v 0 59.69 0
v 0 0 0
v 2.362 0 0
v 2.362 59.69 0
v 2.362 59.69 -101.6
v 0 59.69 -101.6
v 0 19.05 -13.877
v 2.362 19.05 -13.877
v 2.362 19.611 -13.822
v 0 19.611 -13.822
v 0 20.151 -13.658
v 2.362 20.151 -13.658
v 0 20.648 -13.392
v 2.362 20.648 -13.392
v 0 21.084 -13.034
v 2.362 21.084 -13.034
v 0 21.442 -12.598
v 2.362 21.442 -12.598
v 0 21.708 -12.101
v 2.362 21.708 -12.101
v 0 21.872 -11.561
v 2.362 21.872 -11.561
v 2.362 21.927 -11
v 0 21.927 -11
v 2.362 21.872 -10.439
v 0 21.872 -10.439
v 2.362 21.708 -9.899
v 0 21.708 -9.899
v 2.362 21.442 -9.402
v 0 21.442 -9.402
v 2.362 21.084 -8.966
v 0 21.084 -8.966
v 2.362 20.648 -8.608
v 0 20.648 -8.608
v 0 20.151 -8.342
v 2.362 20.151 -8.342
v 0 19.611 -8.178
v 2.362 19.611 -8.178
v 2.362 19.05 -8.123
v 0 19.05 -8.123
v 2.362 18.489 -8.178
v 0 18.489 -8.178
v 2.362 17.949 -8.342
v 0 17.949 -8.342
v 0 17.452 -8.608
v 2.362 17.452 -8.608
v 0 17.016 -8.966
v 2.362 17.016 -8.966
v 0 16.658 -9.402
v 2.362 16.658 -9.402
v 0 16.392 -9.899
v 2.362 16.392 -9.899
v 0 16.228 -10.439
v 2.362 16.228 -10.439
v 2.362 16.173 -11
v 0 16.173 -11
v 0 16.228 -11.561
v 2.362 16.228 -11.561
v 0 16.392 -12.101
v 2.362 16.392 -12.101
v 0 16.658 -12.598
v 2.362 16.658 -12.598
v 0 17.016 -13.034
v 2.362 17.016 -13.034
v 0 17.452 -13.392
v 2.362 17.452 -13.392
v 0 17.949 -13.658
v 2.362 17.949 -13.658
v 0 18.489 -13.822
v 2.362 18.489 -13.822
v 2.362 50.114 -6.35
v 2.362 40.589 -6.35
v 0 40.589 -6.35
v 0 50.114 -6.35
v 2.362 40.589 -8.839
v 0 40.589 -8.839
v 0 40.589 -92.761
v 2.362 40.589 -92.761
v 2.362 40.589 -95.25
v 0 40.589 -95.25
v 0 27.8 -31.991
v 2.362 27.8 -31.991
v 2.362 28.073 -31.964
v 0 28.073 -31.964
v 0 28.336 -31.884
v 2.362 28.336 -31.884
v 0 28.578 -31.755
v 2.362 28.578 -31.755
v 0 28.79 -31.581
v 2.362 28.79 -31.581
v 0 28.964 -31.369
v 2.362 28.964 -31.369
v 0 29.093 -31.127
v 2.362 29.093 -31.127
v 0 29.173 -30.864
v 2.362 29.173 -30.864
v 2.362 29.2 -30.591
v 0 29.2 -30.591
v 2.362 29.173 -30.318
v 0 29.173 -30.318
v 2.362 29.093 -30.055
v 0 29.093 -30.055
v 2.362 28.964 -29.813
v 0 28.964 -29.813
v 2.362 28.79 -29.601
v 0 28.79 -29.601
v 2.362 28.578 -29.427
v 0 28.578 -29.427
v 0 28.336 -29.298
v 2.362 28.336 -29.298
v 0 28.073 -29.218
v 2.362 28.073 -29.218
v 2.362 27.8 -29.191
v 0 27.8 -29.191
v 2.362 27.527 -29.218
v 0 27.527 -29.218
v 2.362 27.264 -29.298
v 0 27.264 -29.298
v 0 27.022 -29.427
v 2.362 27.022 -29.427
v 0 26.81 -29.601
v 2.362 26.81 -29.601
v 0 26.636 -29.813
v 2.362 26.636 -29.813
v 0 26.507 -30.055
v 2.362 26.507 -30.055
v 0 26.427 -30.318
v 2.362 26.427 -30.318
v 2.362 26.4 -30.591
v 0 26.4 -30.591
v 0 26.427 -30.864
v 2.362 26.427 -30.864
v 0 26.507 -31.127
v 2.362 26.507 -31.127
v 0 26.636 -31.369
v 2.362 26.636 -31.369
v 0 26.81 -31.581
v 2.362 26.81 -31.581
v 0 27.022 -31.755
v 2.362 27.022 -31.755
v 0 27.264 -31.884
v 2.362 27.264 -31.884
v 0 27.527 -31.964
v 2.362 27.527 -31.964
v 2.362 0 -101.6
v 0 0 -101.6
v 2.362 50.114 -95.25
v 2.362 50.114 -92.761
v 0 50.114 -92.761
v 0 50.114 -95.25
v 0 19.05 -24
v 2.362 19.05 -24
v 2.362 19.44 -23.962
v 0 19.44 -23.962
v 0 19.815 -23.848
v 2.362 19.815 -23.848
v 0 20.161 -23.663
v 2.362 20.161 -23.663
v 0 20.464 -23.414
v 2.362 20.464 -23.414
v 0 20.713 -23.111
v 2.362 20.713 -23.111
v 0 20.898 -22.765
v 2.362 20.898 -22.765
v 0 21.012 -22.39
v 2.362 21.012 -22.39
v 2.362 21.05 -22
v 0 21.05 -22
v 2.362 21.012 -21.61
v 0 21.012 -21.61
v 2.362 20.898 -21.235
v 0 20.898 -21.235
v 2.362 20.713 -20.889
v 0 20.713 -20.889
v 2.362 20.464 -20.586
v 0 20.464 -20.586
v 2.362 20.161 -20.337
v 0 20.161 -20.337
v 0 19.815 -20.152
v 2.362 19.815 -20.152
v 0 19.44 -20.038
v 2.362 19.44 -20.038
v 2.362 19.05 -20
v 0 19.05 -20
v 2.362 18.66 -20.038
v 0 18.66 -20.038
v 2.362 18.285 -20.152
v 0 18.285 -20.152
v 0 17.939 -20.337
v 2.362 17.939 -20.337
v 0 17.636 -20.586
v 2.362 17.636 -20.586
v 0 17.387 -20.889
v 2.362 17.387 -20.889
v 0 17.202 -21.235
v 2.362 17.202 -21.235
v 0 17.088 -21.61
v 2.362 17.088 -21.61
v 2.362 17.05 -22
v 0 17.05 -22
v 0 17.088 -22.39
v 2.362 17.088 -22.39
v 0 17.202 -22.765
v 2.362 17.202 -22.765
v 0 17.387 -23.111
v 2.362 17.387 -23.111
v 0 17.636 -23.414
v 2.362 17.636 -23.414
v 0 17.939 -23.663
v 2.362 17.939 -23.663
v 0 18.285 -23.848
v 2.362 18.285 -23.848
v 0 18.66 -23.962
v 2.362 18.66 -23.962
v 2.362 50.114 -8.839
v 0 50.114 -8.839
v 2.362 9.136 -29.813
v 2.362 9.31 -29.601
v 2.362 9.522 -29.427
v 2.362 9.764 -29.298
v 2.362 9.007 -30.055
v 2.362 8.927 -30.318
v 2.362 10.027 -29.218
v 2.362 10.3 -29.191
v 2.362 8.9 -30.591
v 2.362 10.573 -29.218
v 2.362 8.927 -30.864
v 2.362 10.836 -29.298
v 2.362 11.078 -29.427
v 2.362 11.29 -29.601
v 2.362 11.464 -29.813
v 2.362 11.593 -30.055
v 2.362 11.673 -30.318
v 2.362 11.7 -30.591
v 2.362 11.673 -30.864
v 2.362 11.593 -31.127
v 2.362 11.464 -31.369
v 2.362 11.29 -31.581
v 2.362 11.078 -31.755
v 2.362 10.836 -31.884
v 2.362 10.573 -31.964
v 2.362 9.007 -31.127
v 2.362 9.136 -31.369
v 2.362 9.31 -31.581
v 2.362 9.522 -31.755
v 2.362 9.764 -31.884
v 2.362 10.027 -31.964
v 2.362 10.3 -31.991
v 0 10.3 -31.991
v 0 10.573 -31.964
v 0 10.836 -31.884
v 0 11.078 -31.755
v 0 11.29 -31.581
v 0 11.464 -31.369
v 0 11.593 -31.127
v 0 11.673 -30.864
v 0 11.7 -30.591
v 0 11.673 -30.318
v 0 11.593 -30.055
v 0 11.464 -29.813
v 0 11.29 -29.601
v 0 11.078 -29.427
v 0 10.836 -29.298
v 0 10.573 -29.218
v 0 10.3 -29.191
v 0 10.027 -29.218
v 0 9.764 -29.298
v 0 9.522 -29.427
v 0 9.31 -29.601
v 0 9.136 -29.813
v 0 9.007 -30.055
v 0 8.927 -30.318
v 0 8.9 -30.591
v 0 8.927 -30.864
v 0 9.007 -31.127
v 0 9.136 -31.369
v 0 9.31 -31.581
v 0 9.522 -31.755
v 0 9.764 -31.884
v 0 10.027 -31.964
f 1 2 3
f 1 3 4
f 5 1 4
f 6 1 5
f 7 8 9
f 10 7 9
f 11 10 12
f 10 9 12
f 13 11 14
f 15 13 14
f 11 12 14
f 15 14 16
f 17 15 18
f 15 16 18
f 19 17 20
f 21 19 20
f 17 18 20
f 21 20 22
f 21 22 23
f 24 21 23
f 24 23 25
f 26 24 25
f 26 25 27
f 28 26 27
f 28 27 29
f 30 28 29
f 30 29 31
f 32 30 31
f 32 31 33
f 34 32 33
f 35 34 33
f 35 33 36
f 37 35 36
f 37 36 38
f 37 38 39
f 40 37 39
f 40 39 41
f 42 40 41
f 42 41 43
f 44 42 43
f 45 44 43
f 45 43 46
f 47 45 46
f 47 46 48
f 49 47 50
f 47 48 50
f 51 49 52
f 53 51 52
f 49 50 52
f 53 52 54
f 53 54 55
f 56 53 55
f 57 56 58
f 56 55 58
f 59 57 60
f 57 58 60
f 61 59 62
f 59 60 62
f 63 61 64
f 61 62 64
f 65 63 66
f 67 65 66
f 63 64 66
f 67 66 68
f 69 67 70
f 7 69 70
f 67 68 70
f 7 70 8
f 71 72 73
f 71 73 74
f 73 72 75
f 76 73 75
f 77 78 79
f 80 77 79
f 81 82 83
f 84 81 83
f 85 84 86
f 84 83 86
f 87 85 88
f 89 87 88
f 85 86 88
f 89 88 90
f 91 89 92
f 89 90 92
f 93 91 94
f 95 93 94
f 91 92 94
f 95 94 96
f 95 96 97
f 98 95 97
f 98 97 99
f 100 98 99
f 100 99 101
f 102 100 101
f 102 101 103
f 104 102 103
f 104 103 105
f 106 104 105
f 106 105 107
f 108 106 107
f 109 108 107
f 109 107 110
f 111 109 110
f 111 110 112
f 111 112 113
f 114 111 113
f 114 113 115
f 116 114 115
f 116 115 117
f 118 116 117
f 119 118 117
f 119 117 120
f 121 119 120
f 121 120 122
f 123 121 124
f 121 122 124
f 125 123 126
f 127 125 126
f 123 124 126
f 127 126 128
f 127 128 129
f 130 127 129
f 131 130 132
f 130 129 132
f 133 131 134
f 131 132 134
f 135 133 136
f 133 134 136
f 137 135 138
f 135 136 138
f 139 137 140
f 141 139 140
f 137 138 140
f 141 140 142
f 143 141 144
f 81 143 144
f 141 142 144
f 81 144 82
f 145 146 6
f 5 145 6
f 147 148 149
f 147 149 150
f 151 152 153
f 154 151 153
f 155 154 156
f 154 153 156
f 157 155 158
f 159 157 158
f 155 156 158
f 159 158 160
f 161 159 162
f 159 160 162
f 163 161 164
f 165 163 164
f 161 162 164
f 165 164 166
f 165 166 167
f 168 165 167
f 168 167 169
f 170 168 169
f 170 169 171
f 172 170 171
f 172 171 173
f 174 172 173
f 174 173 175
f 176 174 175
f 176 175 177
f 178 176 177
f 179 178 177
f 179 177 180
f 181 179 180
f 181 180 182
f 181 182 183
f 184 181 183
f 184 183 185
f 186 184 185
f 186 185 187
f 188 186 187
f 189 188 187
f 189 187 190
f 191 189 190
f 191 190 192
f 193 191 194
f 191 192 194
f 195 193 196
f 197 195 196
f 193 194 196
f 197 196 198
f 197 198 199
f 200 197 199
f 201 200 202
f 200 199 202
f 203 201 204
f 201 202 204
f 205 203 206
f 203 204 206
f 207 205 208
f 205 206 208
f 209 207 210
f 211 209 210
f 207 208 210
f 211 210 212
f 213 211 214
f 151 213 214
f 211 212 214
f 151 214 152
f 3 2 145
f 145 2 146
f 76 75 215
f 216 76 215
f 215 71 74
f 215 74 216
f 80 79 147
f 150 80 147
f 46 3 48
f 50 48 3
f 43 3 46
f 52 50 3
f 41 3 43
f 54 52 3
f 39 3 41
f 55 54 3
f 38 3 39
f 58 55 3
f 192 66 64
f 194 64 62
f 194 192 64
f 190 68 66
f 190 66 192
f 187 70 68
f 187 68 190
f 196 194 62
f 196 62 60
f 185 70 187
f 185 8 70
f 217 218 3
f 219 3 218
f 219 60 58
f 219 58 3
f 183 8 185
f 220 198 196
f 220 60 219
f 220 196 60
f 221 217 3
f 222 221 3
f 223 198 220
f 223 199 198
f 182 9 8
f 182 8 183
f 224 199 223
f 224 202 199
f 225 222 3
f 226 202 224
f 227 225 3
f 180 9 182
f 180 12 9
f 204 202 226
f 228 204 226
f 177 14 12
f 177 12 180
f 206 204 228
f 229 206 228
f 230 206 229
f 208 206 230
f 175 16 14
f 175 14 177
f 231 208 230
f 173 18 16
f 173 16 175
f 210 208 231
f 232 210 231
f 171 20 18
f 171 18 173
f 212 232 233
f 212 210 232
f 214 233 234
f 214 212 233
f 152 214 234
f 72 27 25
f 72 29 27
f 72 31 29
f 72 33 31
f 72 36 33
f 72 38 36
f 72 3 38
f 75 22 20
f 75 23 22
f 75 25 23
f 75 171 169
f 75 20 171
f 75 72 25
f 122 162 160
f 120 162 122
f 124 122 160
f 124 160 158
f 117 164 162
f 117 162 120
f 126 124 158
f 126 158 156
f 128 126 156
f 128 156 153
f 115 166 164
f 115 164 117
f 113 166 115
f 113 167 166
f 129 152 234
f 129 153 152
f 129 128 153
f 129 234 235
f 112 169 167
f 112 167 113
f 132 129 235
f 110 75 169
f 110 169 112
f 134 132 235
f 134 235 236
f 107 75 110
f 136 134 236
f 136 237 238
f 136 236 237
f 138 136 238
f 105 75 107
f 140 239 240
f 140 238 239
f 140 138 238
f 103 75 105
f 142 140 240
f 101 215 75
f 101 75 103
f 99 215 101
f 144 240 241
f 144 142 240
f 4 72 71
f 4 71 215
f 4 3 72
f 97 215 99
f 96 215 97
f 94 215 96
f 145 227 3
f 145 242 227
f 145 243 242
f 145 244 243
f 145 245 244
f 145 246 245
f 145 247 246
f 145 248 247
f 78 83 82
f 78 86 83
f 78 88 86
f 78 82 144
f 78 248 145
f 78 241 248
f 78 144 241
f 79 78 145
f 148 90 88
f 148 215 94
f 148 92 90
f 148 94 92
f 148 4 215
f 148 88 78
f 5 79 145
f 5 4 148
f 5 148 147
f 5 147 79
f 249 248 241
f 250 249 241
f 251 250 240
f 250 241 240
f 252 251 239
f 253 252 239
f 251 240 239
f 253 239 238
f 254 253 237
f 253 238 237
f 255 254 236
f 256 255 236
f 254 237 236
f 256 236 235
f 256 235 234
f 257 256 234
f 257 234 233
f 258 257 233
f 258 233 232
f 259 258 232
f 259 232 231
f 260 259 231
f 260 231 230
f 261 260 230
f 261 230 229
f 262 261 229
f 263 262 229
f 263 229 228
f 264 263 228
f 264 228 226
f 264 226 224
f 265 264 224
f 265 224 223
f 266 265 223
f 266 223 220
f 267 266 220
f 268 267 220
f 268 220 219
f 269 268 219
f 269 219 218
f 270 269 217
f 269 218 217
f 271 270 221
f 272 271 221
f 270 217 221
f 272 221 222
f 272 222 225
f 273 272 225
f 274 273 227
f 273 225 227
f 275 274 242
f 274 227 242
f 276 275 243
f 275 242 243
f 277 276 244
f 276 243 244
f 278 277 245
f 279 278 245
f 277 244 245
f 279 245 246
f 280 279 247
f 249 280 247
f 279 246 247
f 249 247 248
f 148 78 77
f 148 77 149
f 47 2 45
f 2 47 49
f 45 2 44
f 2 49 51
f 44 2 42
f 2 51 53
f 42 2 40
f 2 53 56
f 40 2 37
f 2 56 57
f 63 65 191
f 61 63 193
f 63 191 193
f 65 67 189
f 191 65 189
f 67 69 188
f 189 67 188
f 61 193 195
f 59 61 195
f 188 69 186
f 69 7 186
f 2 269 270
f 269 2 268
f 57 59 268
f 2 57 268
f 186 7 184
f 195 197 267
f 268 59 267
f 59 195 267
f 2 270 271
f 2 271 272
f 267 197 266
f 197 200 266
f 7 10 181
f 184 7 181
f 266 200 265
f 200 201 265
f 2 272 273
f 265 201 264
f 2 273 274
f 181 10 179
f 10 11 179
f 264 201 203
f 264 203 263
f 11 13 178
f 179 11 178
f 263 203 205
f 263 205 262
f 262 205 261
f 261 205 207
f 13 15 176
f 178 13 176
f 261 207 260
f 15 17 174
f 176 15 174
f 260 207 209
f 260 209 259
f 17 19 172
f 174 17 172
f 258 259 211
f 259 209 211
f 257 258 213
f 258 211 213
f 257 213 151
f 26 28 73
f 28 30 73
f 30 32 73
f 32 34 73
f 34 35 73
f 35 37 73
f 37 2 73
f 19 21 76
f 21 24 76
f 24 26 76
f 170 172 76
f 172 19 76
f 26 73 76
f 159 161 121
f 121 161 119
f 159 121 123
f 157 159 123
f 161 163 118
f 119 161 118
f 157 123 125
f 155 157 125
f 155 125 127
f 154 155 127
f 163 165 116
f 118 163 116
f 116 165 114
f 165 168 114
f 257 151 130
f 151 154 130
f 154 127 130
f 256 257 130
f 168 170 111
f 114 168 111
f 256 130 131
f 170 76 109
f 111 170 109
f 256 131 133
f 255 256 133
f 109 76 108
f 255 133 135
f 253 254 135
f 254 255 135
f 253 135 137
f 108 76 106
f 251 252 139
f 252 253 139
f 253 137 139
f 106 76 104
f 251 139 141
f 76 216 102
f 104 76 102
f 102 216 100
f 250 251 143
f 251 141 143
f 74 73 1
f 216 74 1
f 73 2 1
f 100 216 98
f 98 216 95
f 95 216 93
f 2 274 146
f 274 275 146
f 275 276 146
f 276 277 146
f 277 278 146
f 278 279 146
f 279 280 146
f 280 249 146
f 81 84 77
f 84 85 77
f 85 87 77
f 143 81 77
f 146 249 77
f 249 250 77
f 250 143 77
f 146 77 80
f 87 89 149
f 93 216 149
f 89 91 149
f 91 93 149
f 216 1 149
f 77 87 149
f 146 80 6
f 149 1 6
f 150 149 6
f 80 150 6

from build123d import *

# Parameters (mm, degrees)
SKETCH1_W           = 101.6
SKETCH1_H           = 59.69
BOSS_EXTRUDE1_DEPTH = 2.3622
CUT_EXTRUDE1_REACH  = 4.362
SKETCH2_R           = 1.4
SKETCH2_R_2         = 2
SKETCH2_R_3         = 2.876999961
SKETCH4_W           = 2.4892
SKETCH4_H           = 9.525
CUT_EXTRUDE3_DEPTH  = 3.3622


with BuildPart() as part:
    # Sketch1 → Boss-Extrude1 (new body)
    with BuildSketch(Plane(origin=(0, 0, 0), x_dir=(0, 0, -1), z_dir=(1, 0, 0))):
        with Locations((50.8, 29.845)):
            Rectangle(SKETCH1_W, SKETCH1_H)
    extrude(amount=BOSS_EXTRUDE1_DEPTH)

    # Sketch2 → Cut-Extrude1 (cut, up to next)
    with BuildSketch(Plane(origin=(2.3622, 0, 0), x_dir=(0, 0, -1), z_dir=(1, 0, 0)), mode=Mode.PRIVATE) as cut_extrude1_sk1:
        with Locations((30.59102, 10.3)):
            Circle(SKETCH2_R)
    cut_extrude1_tool1 = extrude(cut_extrude1_sk1.sketch, amount=-CUT_EXTRUDE1_REACH, mode=Mode.PRIVATE) & part.part
    add(cut_extrude1_tool1.solids().sort_by_distance((2.3622, 10.3, -30.59102))[0], mode=Mode.SUBTRACT)
    # Sketch2 → Cut-Extrude1 (cut, up to next)
    with BuildSketch(Plane(origin=(2.3622, 0, 0), x_dir=(0, 0, -1), z_dir=(1, 0, 0)), mode=Mode.PRIVATE) as cut_extrude1_sk2:
        with Locations((30.59102, 27.8)):
            Circle(SKETCH2_R)
    cut_extrude1_tool2 = extrude(cut_extrude1_sk2.sketch, amount=-CUT_EXTRUDE1_REACH, mode=Mode.PRIVATE) & part.part
    add(cut_extrude1_tool2.solids().sort_by_distance((2.3622, 27.8, -30.59102))[0], mode=Mode.SUBTRACT)
    # Sketch2 → Cut-Extrude1 (cut, up to next)
    with BuildSketch(Plane(origin=(2.3622, 0, 0), x_dir=(0, 0, -1), z_dir=(1, 0, 0)), mode=Mode.PRIVATE) as cut_extrude1_sk3:
        with Locations((22.0000034, 19.05)):
            Circle(SKETCH2_R_2)
    cut_extrude1_tool3 = extrude(cut_extrude1_sk3.sketch, amount=-CUT_EXTRUDE1_REACH, mode=Mode.PRIVATE) & part.part
    add(cut_extrude1_tool3.solids().sort_by_distance((2.3622, 19.05, -22.000003))[0], mode=Mode.SUBTRACT)
    # Sketch2 → Cut-Extrude1 (cut, up to next)
    with BuildSketch(Plane(origin=(2.3622, 0, 0), x_dir=(0, 0, -1), z_dir=(1, 0, 0)), mode=Mode.PRIVATE) as cut_extrude1_sk4:
        with Locations((11, 19.05)):
            Circle(SKETCH2_R_3)
    cut_extrude1_tool4 = extrude(cut_extrude1_sk4.sketch, amount=-CUT_EXTRUDE1_REACH, mode=Mode.PRIVATE) & part.part
    add(cut_extrude1_tool4.solids().sort_by_distance((2.3622, 19.05, -11))[0], mode=Mode.SUBTRACT)

    # Sketch4 → Cut-Extrude3 (cut, through all)
    with BuildSketch(Plane(origin=(2.3622, 0, 0), x_dir=(0, 0, -1), z_dir=(1, 0, 0))):
        with Locations((7.5946, 45.3517)):
            Rectangle(SKETCH4_W, SKETCH4_H)
        with Locations((94.0054, 45.3517)):
            Rectangle(SKETCH4_W, SKETCH4_H)
    extrude(amount=-CUT_EXTRUDE3_DEPTH, mode=Mode.SUBTRACT)


solid = part.part
